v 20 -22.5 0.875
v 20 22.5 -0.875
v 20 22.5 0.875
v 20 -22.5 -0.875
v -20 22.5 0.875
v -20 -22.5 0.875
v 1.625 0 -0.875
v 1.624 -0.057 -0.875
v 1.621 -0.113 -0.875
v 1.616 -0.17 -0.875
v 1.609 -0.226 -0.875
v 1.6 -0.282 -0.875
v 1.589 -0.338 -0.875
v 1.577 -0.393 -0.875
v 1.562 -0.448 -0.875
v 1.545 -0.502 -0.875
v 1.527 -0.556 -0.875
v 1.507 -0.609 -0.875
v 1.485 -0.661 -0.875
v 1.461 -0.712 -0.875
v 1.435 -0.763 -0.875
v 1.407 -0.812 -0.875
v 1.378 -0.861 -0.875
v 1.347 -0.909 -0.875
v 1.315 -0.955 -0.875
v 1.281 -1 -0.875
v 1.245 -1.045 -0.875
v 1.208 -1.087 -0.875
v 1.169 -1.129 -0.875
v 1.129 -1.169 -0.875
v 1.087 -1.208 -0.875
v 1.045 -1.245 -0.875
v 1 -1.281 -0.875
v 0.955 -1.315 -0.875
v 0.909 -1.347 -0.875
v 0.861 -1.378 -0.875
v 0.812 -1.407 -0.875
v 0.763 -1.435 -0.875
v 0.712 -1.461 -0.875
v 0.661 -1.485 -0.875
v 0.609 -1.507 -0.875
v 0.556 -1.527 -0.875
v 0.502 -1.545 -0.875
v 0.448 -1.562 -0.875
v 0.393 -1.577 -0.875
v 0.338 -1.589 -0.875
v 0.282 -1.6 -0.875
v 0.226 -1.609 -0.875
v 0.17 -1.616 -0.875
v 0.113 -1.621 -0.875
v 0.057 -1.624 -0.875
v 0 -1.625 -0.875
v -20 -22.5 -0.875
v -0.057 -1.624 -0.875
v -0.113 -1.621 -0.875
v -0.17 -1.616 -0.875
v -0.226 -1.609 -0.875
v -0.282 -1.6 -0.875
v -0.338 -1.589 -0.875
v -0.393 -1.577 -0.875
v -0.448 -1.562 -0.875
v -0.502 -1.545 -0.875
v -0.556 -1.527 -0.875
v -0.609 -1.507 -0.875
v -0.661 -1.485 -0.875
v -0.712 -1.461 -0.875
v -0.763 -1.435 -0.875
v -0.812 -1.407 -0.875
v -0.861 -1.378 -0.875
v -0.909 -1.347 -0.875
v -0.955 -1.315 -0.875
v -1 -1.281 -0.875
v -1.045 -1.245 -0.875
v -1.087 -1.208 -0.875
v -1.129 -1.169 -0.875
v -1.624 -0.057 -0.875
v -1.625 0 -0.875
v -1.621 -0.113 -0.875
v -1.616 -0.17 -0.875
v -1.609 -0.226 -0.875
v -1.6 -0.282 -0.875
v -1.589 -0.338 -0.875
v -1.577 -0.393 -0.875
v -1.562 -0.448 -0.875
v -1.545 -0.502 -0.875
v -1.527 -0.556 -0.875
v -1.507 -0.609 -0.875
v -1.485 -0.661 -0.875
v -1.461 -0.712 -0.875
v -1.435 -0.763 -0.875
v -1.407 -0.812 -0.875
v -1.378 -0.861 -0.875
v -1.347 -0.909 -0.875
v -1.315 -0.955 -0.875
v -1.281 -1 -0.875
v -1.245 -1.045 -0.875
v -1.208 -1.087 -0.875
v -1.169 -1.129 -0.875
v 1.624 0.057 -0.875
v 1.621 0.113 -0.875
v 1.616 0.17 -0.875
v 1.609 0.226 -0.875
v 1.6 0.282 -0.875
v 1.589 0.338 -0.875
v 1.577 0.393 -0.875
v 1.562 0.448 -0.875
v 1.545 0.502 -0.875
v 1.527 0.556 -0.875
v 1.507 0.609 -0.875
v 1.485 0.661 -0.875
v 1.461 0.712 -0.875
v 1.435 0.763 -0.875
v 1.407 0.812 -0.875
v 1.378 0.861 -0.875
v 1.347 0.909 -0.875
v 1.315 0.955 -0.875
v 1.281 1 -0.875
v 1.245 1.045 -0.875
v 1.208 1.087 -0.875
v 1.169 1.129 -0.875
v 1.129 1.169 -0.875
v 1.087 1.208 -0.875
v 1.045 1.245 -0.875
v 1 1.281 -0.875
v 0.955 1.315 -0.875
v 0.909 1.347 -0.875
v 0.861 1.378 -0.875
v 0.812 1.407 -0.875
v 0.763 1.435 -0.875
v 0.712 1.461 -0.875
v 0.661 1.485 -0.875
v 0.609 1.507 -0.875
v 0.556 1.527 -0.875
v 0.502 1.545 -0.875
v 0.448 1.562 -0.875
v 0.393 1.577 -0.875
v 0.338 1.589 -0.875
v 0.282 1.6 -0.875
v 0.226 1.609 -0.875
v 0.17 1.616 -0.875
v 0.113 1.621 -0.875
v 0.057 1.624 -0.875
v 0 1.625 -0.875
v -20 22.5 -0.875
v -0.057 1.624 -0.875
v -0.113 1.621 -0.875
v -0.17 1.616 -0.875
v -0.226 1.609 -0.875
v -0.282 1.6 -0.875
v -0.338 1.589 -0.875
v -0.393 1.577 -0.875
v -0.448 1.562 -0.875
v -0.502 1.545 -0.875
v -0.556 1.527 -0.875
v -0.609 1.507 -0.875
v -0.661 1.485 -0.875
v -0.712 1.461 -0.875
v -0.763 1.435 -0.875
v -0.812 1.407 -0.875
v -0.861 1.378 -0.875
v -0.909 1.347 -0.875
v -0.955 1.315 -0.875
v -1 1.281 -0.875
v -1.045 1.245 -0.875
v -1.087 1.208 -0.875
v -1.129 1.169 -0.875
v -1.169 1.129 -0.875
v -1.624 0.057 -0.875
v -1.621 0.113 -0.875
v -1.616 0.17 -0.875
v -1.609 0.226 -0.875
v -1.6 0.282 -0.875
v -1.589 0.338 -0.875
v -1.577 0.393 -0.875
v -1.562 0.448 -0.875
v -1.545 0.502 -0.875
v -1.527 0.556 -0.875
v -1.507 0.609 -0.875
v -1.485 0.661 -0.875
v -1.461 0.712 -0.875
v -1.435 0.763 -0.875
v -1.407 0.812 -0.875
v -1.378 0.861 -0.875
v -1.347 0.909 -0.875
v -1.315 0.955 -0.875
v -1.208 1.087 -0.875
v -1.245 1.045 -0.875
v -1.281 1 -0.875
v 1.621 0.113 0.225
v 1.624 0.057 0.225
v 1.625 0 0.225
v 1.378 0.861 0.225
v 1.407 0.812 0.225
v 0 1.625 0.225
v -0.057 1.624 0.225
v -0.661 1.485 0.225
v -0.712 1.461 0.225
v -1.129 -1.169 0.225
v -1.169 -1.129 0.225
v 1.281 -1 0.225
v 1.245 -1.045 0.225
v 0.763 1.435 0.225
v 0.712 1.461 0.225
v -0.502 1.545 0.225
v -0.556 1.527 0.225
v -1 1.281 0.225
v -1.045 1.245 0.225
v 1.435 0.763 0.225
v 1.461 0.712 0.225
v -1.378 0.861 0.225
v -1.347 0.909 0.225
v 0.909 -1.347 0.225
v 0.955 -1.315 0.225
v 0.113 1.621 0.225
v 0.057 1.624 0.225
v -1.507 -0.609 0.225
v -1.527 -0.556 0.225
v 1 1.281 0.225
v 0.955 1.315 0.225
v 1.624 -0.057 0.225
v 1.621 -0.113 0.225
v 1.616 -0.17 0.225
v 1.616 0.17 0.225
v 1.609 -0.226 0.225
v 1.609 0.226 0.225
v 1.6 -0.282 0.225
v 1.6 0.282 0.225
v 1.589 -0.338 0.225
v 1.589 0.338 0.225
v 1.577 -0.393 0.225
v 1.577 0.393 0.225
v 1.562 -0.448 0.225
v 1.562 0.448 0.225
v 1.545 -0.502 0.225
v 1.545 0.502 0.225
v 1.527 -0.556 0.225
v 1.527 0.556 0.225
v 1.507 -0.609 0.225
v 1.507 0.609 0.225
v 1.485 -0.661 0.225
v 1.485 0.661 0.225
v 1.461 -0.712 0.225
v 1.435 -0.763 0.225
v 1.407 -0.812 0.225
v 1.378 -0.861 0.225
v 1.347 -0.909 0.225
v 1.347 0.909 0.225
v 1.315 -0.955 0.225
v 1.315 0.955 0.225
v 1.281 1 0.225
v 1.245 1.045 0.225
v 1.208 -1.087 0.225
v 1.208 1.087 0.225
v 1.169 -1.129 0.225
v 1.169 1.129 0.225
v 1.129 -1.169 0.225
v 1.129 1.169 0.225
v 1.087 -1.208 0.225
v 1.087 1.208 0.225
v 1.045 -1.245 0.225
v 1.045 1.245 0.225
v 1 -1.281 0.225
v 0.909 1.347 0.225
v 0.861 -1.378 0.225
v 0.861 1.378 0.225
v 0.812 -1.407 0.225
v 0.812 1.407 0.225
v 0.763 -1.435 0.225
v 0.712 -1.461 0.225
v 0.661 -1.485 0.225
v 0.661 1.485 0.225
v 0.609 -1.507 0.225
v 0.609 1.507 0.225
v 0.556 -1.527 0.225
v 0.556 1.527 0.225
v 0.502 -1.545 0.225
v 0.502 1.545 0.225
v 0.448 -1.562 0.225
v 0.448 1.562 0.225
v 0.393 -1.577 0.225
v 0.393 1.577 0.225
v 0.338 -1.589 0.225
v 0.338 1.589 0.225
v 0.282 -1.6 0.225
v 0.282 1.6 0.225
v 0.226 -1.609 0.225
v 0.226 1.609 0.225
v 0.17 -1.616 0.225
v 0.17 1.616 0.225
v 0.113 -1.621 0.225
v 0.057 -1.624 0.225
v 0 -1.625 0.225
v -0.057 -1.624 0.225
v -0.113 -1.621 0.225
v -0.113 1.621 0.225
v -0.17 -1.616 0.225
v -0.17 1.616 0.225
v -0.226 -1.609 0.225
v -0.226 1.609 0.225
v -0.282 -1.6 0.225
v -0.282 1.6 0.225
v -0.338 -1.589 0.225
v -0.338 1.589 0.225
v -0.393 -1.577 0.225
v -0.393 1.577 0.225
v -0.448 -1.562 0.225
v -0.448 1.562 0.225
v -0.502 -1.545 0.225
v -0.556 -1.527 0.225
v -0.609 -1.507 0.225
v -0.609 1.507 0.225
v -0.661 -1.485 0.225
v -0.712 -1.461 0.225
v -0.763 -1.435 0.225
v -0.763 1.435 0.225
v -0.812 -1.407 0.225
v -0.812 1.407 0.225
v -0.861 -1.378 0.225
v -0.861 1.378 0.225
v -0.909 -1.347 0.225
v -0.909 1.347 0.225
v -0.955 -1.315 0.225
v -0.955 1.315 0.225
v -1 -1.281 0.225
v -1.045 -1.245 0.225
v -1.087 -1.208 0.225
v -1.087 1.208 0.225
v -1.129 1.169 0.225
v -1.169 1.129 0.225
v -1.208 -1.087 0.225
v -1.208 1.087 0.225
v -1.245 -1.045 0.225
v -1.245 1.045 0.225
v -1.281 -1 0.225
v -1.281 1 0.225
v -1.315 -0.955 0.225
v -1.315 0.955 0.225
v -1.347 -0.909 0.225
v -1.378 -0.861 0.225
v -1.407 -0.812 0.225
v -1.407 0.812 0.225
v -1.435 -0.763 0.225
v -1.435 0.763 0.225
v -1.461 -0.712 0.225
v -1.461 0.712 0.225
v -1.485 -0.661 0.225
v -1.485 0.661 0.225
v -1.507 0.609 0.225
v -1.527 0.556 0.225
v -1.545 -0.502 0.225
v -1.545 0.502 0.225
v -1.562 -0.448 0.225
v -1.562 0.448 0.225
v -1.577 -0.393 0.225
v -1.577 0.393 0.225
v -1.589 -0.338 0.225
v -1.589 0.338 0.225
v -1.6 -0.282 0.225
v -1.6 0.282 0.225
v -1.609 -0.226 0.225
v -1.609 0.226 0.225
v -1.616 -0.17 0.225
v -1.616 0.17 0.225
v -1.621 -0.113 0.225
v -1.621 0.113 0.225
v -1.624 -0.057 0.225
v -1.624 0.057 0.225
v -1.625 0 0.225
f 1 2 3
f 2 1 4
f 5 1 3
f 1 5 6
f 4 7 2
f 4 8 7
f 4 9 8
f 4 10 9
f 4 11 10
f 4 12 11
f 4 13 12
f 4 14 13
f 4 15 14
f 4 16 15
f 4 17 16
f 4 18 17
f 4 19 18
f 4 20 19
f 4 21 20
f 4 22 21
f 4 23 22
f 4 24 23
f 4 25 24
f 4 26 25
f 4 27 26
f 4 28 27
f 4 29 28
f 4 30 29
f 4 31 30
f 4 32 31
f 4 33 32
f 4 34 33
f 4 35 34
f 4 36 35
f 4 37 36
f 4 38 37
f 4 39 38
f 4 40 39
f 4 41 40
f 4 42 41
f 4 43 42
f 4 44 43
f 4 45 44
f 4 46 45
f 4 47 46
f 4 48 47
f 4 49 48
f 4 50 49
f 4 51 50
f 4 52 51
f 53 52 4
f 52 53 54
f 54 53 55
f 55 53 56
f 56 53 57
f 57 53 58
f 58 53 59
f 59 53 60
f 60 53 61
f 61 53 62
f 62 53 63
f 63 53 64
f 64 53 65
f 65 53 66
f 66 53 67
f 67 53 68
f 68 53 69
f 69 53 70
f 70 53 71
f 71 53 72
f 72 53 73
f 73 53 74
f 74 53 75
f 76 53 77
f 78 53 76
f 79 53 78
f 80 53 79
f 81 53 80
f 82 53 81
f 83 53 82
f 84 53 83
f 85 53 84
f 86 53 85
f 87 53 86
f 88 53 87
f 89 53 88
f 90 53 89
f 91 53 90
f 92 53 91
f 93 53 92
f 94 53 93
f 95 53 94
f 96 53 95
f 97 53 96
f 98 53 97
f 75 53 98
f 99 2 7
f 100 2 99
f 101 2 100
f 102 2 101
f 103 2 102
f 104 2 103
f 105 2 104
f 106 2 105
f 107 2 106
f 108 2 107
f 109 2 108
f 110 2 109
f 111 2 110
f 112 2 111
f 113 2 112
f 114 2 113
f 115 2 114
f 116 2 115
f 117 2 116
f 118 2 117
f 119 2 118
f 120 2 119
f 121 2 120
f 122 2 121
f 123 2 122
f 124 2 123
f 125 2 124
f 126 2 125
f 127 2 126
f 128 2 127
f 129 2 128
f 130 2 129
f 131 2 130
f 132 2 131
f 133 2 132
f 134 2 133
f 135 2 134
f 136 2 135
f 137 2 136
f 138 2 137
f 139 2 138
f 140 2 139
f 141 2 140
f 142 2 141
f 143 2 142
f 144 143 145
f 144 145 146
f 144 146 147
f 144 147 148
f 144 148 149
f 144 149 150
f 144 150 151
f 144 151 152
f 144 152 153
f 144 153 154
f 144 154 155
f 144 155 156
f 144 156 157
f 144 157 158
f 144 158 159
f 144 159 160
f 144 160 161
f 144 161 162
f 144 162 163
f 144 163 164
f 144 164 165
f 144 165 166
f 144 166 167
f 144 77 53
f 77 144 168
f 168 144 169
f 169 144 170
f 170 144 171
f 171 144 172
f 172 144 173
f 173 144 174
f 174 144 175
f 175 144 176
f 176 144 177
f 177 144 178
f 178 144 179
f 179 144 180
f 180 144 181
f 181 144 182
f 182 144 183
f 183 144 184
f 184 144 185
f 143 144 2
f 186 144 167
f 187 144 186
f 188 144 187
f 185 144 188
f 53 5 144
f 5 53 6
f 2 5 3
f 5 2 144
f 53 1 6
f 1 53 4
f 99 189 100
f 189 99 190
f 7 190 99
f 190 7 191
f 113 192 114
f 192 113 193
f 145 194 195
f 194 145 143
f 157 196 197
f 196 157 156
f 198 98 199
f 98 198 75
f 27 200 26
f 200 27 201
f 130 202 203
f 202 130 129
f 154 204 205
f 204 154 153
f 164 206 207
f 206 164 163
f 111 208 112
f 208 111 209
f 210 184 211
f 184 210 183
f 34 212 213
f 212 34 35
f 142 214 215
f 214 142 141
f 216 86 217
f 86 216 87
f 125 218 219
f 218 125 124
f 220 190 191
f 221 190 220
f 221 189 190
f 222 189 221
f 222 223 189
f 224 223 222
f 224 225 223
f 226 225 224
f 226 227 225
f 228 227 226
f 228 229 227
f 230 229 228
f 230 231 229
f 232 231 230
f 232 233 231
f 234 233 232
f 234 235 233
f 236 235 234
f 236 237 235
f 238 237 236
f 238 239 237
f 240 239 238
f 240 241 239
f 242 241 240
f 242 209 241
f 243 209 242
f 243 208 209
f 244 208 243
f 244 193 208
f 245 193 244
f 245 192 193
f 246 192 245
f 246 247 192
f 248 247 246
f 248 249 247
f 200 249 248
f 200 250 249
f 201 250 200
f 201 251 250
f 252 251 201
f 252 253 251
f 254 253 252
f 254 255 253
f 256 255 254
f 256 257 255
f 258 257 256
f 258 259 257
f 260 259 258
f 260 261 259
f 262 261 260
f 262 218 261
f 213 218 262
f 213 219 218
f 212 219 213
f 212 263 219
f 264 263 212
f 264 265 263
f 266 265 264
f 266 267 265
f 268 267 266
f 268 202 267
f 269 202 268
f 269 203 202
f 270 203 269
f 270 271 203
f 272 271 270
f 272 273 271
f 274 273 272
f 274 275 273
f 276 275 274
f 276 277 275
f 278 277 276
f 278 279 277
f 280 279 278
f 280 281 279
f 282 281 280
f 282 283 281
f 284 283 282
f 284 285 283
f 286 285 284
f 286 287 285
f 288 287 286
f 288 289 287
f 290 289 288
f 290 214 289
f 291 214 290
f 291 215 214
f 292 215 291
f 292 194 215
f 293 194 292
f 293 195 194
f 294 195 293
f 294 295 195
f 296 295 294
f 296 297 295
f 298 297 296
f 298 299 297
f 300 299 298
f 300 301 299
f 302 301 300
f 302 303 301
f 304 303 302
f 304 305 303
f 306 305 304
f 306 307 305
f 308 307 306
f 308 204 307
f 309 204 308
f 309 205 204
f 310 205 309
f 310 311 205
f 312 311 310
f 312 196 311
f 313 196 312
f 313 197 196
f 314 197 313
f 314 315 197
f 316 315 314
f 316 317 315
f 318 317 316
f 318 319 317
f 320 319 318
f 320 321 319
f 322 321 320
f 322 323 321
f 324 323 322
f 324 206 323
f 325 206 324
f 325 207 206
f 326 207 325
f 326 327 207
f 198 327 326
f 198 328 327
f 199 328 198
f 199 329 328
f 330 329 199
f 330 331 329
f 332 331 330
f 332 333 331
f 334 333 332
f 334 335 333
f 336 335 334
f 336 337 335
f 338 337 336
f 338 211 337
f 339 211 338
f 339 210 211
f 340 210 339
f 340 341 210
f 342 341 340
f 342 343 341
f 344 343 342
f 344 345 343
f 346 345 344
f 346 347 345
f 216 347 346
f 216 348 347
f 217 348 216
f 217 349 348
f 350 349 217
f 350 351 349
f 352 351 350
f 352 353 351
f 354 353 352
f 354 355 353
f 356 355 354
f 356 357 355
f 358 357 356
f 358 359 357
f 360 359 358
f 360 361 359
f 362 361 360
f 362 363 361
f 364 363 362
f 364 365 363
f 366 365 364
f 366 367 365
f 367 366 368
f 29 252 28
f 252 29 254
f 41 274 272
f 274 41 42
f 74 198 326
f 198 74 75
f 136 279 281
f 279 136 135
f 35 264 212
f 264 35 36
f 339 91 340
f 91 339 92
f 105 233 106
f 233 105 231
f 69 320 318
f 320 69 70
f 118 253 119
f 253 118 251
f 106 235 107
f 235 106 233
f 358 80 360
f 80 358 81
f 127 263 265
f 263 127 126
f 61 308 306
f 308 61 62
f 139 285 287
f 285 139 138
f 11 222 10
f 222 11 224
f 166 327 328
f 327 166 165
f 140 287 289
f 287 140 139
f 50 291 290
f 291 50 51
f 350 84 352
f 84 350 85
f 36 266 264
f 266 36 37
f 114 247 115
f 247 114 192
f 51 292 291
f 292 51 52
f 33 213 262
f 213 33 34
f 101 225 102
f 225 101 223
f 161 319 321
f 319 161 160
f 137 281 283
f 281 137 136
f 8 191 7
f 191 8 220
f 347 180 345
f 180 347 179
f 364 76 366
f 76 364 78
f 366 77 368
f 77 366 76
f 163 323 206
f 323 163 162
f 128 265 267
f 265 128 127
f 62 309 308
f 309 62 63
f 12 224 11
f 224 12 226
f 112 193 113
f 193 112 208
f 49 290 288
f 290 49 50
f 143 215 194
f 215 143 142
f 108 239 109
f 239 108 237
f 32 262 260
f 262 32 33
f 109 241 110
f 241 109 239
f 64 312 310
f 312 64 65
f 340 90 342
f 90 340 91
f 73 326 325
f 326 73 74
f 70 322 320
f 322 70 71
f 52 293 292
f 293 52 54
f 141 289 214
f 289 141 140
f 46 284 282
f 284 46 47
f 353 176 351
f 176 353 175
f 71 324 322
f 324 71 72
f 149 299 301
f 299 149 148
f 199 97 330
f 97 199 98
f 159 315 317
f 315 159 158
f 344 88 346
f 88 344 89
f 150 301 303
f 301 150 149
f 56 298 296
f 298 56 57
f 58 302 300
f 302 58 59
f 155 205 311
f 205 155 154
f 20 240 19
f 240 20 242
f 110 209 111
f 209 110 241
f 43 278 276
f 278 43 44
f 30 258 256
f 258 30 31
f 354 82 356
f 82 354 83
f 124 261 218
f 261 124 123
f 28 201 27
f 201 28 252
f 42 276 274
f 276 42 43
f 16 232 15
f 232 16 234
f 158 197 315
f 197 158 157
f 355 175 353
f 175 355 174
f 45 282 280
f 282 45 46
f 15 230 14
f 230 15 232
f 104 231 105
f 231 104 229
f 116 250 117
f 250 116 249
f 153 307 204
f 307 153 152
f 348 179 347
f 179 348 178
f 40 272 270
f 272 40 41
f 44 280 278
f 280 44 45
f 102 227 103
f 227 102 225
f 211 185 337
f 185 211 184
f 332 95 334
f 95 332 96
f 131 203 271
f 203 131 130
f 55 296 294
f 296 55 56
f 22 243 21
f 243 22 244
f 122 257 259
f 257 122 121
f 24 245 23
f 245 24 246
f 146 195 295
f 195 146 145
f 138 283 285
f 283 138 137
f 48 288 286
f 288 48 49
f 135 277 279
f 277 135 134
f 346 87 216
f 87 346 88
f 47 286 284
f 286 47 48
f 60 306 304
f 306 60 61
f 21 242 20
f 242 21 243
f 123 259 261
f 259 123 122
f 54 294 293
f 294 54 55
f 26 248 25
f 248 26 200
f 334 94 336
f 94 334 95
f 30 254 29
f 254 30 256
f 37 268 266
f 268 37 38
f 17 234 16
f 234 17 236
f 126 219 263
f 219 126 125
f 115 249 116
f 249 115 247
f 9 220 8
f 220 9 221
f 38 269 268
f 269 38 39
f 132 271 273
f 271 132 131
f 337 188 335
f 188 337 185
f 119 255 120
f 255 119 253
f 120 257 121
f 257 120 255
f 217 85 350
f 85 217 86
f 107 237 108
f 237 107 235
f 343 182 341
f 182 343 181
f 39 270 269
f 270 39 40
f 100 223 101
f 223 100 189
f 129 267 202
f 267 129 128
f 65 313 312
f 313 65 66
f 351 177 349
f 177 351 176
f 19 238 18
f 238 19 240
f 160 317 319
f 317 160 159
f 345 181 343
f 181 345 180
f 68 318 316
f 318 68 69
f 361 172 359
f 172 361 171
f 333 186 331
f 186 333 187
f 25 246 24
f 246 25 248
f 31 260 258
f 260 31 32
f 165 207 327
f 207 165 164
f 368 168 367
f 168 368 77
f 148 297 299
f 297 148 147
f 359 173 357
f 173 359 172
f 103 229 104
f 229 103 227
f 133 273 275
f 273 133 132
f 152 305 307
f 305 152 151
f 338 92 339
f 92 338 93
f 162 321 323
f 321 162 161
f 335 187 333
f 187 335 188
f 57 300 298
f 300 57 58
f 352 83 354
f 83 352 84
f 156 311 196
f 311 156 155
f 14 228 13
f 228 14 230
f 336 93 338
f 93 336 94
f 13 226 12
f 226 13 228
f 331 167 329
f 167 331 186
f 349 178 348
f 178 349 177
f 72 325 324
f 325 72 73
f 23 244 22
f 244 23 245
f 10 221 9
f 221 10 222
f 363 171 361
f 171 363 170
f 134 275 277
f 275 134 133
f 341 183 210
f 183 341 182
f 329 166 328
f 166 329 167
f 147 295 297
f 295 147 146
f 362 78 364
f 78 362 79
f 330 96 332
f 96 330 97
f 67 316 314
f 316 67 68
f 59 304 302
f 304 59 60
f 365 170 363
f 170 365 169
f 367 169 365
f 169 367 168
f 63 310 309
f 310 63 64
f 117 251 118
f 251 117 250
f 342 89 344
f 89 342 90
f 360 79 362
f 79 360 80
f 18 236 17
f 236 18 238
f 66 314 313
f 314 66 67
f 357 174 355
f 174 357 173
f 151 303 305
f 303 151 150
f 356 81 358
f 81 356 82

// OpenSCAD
base_width=25;
base_depth=1.75;
$fn=180;

module round(width) {
    difference() {
        cylinder(h=base_depth, d=width, center=true);
        magnet(d=width-2);
    }
}

module square(width, length) {
    difference() {
        cube([width, length, base_depth], true);
        magnet();
    }
}

module magnet(d=3.25) {
    color("red")
    translate([0, 0, -base_depth/2])
    cylinder(h=1.1, d=d);
}

square(40, 45);
// round(40);

// translate([0, 50, 0])
// round(30);

// translate([0, 100, 0])
// round(25);
